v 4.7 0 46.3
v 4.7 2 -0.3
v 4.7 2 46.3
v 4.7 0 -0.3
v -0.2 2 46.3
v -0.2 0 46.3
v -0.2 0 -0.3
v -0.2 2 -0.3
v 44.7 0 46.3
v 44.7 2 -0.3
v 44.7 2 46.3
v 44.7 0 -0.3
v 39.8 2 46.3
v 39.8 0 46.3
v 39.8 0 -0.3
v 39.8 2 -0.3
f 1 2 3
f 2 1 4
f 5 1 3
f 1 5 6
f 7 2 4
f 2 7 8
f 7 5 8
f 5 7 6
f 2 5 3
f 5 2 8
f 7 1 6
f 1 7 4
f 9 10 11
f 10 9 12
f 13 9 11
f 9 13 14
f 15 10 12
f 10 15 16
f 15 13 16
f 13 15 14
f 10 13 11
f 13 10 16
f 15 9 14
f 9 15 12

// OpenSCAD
skadis_hook_width = 4.5;
skadis_hook_height = 46;
skadis_hole_spacing_width = 40; // middle to middle
cutout_tolerance_w = 0.4;
cutout_tolerance_h = 0.6;


module skadis_hook_cutout(center=false, hook_count=2) {
    
    if(center) {
        translate([-(skadis_hole_spacing_width + skadis_hook_width) / 2, 0, - skadis_hook_height / 2])
        object(hook_count);
    } else {
        object();
    }
    

}

module object(hook_count=2) {
    union() {

        // Cutout for the hook 1
        color("red")
        translate([- cutout_tolerance_w / 2, 0, - cutout_tolerance_h / 2])
        cube([skadis_hook_width + cutout_tolerance_w, 2, skadis_hook_height + cutout_tolerance_h]);

        // Cutout for the hook 2
        color("red")
        translate([- cutout_tolerance_w / 2 + skadis_hole_spacing_width, 0, - cutout_tolerance_h / 2])
        cube([skadis_hook_width + cutout_tolerance_w, 2, skadis_hook_height + cutout_tolerance_h]);

    }
}

skadis_hook_cutout(center = false);
